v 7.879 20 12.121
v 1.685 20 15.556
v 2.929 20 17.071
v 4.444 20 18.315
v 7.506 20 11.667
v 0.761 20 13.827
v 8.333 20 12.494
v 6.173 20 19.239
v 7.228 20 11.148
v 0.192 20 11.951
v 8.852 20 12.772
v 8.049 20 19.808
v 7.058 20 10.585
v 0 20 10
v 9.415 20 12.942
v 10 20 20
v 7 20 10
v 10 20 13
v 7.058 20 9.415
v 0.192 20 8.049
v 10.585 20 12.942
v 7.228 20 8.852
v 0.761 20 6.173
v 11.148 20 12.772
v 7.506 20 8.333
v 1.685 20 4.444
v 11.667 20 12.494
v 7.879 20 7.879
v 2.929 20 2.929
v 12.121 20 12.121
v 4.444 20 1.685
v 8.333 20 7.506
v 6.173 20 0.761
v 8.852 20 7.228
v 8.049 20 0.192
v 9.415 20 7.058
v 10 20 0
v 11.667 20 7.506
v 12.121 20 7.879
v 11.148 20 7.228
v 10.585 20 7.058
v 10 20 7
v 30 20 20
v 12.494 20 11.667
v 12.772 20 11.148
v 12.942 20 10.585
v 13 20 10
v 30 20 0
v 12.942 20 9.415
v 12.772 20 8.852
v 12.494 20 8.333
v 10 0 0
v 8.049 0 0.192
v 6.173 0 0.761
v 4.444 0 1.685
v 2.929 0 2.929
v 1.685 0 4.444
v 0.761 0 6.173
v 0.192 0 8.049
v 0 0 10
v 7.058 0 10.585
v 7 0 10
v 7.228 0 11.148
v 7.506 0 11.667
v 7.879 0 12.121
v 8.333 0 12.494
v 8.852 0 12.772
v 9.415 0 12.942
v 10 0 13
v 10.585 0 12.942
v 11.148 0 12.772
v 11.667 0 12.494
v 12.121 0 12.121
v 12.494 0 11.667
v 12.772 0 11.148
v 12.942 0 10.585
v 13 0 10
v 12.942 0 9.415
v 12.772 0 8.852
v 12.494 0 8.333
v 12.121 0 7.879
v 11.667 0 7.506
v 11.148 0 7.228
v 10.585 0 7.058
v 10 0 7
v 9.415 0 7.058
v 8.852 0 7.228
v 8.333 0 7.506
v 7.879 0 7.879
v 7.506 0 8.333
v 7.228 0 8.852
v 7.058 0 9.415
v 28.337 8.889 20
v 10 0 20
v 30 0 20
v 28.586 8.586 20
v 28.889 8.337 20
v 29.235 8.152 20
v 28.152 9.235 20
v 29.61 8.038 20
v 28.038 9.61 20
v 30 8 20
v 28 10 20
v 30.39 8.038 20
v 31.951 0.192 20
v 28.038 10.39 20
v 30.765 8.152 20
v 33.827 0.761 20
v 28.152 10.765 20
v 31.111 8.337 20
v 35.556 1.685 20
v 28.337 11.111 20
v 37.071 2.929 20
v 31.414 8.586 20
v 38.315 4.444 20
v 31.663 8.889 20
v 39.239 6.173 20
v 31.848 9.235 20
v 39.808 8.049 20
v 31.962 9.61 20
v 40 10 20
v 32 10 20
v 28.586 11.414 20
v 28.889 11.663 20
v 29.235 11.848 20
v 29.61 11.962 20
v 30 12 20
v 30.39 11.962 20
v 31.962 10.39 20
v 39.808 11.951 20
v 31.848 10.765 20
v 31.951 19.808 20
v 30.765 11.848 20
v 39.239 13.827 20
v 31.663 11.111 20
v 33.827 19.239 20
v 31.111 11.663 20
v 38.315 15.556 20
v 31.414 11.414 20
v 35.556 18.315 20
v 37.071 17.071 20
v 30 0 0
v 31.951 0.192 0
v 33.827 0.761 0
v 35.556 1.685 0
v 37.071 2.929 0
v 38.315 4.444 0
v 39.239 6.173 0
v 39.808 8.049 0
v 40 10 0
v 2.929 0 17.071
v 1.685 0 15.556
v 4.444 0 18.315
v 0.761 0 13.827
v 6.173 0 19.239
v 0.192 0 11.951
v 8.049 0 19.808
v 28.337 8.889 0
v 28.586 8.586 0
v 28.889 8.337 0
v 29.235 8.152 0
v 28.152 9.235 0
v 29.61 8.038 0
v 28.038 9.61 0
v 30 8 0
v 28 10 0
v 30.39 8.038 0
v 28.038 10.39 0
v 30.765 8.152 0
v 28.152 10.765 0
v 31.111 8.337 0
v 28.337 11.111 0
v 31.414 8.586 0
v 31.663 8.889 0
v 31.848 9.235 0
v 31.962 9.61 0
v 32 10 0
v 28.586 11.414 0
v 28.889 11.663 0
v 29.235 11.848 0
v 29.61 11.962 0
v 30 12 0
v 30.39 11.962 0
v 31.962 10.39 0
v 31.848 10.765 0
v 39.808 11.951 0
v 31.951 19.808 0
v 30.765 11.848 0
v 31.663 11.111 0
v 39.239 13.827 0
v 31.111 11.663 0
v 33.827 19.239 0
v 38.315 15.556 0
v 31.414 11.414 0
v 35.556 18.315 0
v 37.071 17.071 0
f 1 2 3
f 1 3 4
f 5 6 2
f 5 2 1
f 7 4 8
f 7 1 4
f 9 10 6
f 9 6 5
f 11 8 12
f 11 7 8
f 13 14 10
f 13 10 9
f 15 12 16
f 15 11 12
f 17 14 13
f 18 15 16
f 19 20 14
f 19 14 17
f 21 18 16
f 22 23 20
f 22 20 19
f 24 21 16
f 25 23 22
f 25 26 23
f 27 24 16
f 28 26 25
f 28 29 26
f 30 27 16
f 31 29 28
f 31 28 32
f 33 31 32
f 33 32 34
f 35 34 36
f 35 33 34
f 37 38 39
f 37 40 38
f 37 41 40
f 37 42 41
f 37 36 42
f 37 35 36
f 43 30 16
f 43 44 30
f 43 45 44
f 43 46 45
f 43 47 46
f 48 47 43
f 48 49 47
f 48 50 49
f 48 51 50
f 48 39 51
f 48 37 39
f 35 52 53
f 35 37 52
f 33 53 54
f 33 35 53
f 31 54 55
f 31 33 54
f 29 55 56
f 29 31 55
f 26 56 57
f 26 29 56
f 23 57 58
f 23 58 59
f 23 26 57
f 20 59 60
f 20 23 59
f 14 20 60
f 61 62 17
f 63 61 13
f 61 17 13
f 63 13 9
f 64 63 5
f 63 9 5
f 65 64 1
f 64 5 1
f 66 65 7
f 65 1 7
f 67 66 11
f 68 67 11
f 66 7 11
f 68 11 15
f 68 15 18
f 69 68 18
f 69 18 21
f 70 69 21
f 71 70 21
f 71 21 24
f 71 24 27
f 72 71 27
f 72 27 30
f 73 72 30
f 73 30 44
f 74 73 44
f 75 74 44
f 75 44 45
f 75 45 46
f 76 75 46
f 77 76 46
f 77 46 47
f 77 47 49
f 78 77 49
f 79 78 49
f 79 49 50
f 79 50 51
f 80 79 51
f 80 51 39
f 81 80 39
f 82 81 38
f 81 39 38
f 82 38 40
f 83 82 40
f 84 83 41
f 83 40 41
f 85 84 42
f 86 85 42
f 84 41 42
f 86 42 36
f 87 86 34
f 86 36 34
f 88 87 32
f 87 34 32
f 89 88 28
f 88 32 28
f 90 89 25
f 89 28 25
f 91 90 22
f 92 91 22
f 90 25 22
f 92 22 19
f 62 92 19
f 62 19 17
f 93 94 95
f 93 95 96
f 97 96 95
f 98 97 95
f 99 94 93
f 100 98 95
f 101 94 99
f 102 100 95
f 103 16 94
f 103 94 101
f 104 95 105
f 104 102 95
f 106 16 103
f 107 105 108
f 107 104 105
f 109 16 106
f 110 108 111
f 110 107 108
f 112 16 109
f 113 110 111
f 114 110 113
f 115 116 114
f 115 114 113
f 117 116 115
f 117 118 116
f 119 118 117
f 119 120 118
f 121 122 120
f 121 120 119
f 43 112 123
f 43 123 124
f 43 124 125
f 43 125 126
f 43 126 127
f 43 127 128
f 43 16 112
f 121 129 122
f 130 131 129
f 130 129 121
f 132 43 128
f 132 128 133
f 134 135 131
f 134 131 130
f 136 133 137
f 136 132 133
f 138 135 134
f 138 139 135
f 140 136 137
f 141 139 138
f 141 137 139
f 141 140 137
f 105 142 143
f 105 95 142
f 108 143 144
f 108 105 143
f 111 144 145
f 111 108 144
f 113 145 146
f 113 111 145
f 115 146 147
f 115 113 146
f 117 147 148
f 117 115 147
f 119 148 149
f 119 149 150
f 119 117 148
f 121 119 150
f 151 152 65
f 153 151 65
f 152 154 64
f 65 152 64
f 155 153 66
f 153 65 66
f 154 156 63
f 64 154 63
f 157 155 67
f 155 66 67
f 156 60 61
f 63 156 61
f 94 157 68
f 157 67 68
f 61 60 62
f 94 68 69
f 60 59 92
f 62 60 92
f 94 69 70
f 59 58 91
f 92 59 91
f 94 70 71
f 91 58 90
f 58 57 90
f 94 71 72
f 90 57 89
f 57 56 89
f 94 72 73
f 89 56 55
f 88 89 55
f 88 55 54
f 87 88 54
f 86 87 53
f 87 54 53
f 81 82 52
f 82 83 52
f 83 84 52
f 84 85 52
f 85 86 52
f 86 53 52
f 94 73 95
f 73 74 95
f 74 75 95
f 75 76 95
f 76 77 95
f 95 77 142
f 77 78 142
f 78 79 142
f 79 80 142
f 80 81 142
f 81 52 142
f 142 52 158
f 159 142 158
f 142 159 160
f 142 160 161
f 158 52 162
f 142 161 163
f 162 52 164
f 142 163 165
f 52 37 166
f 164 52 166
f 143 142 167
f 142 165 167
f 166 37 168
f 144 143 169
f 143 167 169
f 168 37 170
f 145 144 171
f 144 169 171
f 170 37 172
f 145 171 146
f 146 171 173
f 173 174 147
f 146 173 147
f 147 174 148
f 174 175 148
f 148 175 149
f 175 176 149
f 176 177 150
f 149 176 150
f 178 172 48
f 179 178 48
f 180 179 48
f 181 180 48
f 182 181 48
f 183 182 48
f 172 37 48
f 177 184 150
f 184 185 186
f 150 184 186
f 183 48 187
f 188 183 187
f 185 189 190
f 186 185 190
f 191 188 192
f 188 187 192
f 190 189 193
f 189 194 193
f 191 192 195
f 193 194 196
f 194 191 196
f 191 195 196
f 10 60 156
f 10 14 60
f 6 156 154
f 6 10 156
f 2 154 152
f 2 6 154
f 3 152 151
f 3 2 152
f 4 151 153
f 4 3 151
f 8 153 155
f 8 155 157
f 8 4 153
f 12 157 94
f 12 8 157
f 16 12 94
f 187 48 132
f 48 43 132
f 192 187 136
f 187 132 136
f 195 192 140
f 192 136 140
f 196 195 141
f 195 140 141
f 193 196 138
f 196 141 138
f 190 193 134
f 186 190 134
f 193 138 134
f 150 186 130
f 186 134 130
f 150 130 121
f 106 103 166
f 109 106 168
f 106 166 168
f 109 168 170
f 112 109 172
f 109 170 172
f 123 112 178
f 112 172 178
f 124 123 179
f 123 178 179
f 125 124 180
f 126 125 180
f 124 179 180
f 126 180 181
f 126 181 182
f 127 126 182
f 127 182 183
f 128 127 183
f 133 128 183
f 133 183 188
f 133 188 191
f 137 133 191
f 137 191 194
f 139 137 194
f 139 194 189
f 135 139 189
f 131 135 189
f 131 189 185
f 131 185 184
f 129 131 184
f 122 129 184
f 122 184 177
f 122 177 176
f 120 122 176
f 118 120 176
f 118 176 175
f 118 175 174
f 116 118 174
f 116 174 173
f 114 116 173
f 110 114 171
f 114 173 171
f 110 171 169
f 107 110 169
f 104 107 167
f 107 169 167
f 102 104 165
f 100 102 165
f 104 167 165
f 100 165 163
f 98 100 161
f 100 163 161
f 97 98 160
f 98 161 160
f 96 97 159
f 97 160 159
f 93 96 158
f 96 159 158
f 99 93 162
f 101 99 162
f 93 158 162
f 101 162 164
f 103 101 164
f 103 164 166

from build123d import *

# Parameters (mm, degrees)
F0_W     = 39.9999970493
F0_H     = 20
F1_DEPTH = 20
F3_D     = 4
F5_D     = 6
F6_R     = 9.99999
F7_R     = 9.99999


# Not quite as in the source:
# - a fillet or chamfer is up to 0.001 mm smaller than in the source, because OpenCascade refuses the exact size


with BuildPart() as f1:
    # F0 (on Top) → F1 (new body)
    with BuildSketch(Plane.XY):
        with Locations((19.9999985246, 10)):
            Rectangle(F0_W, F0_H)
    extrude(amount=F1_DEPTH)

    # F3 (through all)
    with Locations(Plane.XY.offset(20)):
        with Locations((30.0000011921, 10)):
            Hole(F3_D / 2)

    # F5 (through all)
    with Locations(Plane.XZ):
        with Locations((10, 10)):
            Hole(F5_D / 2)

    # F6 (radius 10 in the source; OpenCascade refuses exactly that, so slightly less here)
    f6_edges = [f1.edges().sort_by_distance(p)[0] for p in [
        (39.999997, 0, 10),
        (39.999997, 20, 10),
    ]]
    fillet(f6_edges, radius=F6_R)

    # F7 (radius 10 in the source; OpenCascade refuses exactly that, so slightly less here)
    f7_edges = [f1.edges().sort_by_distance(p)[0] for p in [
        (0, 10, 0),
        (0, 10, 20),
    ]]
    fillet(f7_edges, radius=F7_R)


solid = f1.part
